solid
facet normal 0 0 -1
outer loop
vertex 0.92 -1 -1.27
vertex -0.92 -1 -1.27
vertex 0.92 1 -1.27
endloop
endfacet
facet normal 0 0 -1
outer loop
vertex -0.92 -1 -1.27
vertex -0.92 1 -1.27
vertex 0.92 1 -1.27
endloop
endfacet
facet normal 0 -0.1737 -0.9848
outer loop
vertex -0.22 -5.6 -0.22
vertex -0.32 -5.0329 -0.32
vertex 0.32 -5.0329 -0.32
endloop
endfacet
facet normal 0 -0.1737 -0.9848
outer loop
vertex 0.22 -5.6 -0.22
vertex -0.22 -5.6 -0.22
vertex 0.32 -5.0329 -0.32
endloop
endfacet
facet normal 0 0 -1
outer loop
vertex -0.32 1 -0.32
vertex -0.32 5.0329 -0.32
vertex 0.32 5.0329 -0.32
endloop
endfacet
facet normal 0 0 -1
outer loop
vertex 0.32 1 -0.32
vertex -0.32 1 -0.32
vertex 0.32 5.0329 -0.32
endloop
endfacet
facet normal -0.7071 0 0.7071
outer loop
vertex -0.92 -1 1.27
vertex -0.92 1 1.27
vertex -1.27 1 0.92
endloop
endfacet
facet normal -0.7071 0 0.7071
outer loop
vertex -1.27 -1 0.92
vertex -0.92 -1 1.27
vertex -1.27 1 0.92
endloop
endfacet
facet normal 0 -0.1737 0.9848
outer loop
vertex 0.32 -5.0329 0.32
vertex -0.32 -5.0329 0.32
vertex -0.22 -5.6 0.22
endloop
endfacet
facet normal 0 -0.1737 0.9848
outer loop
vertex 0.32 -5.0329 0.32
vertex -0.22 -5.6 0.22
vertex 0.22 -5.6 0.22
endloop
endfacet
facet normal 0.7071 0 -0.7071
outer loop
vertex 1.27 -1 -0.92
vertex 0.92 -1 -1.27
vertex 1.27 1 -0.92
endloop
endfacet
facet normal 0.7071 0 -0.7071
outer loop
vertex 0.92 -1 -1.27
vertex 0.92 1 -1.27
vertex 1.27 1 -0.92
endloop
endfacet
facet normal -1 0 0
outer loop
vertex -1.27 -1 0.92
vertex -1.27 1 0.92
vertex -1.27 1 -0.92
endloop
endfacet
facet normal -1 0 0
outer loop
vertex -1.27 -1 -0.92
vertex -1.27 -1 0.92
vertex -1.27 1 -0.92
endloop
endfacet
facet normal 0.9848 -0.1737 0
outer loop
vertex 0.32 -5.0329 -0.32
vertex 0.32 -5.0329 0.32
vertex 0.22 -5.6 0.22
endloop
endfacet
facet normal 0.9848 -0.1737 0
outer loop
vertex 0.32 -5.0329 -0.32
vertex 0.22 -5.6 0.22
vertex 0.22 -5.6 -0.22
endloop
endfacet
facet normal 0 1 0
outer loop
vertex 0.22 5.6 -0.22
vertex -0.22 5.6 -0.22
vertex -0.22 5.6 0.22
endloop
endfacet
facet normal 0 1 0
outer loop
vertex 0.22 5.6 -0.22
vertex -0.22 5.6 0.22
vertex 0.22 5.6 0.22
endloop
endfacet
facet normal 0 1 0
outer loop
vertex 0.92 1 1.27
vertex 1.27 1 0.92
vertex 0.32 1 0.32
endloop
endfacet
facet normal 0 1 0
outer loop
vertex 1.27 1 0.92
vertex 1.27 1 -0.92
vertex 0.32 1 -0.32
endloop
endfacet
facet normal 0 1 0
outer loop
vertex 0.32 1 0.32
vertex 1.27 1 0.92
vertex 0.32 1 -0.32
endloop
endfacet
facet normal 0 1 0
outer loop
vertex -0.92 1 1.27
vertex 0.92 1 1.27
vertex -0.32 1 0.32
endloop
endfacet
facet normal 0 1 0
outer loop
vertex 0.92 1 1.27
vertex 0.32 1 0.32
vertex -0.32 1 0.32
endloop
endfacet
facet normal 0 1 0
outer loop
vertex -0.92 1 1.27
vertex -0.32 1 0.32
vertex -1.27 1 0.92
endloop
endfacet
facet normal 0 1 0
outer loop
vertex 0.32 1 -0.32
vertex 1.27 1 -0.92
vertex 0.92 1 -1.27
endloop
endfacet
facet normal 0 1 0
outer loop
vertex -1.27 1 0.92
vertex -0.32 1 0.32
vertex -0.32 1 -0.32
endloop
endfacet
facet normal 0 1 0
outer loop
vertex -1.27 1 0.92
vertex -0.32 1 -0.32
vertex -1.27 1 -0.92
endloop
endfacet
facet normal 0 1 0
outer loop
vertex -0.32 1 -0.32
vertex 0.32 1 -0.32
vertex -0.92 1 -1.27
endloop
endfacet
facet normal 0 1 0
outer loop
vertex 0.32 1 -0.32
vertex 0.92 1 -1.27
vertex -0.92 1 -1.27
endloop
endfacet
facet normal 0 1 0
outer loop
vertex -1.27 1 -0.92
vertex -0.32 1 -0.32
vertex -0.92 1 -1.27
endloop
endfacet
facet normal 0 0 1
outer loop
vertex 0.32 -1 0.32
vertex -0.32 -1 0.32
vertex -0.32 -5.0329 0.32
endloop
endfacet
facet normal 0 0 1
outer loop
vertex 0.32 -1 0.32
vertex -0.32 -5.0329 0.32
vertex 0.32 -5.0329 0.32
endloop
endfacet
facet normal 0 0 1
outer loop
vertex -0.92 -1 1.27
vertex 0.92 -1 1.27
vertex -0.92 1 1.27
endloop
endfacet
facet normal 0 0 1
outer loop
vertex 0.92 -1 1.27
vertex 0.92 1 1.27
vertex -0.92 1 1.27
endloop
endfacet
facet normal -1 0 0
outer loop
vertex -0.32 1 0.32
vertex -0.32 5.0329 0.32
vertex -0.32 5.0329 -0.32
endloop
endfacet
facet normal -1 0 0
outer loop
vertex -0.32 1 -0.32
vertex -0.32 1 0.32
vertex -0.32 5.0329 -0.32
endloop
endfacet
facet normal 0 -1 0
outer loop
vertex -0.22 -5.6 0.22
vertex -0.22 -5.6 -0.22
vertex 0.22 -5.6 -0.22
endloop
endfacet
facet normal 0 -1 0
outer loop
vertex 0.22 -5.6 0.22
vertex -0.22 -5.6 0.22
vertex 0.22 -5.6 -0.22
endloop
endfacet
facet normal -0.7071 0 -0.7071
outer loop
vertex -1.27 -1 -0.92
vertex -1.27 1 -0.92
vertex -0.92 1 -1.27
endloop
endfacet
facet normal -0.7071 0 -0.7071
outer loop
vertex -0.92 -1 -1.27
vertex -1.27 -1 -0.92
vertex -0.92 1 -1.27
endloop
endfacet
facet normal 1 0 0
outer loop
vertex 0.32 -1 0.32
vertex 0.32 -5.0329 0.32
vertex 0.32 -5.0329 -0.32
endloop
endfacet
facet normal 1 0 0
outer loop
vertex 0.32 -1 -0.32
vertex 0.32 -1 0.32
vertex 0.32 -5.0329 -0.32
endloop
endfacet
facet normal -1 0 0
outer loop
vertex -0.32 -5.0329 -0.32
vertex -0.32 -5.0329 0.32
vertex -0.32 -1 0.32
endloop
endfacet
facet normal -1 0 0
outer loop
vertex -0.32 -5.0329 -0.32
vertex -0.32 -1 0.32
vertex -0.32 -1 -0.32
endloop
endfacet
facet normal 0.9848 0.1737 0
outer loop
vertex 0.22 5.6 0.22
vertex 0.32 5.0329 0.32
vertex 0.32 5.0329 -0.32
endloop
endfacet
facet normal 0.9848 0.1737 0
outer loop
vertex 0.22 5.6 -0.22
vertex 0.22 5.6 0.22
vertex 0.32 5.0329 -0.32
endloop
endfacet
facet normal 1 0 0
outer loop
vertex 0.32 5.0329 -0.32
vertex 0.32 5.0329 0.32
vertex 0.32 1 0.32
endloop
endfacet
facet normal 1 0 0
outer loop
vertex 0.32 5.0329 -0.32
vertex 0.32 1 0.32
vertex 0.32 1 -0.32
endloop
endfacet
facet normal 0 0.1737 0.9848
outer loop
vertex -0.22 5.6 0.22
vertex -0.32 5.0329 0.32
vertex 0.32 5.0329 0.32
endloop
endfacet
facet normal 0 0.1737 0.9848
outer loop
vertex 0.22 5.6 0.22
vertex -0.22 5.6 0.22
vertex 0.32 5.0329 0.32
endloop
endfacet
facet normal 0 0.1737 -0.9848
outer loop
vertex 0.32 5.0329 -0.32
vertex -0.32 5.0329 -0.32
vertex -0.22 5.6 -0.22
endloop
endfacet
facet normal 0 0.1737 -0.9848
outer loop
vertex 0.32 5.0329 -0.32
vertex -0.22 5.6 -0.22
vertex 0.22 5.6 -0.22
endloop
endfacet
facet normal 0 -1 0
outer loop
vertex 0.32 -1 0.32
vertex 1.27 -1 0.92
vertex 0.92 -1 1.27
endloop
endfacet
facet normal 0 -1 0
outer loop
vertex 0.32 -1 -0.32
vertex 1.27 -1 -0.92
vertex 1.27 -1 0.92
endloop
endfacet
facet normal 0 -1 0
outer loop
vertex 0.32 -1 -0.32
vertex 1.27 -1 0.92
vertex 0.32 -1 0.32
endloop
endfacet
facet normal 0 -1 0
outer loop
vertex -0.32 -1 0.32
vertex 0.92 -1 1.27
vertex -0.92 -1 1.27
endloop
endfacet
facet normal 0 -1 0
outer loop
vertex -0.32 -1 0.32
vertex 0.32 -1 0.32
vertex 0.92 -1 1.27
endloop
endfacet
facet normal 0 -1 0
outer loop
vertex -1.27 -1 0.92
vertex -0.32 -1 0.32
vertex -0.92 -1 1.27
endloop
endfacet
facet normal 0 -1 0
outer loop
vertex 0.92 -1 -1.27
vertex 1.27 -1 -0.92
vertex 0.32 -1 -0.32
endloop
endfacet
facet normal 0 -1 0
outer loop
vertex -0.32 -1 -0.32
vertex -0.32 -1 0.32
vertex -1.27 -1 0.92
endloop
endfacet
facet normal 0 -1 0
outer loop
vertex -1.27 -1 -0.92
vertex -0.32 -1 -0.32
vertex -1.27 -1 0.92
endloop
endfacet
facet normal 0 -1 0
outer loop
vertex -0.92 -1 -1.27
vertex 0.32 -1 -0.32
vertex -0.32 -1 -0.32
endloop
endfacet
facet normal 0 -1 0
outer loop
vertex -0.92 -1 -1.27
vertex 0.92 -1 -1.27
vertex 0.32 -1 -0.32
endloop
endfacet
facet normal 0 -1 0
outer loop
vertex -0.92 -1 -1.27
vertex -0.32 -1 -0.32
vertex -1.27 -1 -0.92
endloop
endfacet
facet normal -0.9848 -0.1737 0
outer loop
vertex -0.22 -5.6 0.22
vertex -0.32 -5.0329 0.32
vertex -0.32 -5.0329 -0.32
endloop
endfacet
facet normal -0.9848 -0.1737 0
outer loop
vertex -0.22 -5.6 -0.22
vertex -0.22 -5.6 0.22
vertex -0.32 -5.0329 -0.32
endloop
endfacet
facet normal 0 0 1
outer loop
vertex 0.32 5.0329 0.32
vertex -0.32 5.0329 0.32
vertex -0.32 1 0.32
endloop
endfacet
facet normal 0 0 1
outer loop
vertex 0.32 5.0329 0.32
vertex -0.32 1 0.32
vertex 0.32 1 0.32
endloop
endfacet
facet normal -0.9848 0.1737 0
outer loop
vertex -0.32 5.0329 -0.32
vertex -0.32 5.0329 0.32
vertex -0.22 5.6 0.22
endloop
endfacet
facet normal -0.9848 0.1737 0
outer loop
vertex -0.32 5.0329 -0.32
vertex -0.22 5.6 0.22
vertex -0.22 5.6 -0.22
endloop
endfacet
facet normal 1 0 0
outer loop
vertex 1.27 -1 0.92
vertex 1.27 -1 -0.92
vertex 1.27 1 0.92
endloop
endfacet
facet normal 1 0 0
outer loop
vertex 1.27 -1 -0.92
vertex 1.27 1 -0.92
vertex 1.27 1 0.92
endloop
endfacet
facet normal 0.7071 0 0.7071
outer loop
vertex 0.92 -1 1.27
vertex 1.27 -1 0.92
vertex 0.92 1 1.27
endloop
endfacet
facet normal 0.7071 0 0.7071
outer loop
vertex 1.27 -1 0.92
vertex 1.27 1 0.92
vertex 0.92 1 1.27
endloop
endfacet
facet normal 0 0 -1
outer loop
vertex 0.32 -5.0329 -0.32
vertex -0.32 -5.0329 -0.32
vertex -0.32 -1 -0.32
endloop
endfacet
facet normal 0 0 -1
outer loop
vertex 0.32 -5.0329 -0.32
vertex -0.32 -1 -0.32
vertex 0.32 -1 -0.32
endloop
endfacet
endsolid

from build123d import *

# Parameters (mm, degrees)
SALIENTE_EXTRUIR1_DEPTH = 1
CROQUIS2_W              = 0.64
CROQUIS2_H              = 0.64
SALIENTE_EXTRUIR2_DEPTH = 5.6
CHAFL_N1_SIZE           = 0.1
CHAFL_N1_SIZE2          = 0.567128182
CHAFL_N1_PART_2_SIZE    = 0.1
CHAFL_N1_PART_2_SIZE2   = 0.567128182


with BuildPart() as part:
    # Croquis1 → Saliente-Extruir1 (new body, symmetric)
    with BuildSketch(Plane(origin=(0, 0, 0), x_dir=(1, 0, 0), z_dir=(0, 1, 0))):
        Polygon((-1.27, 0.92), (-0.92, 1.27), (0.92, 1.27), (1.27, 0.92), (1.27, -0.92), (0.92, -1.27), (-0.92, -1.27), (-1.27, -0.92), align=None)
    extrude(amount=SALIENTE_EXTRUIR1_DEPTH, both=True)

    # Croquis2 → Saliente-Extruir2 (add, symmetric)
    with BuildSketch(Plane(origin=(0, 0, 0), x_dir=(1, 0, 0), z_dir=(0, 1, 0))):
        Rectangle(CROQUIS2_W, CROQUIS2_H)
    extrude(amount=SALIENTE_EXTRUIR2_DEPTH, both=True)

    # Chaflán1
    chafl_n1_edges = [part.edges().sort_by_distance(p)[0] for p in [
        (0.32, -5.6, 0),
        (0, -5.6, -0.32),
        (-0.32, -5.6, 0),
        (0, -5.6, 0.32),
    ]]
    chafl_n1_side = [part.faces().sort_by_distance(p)[0] for p in [
        (0, -5.6, 0),
    ]]
    chamfer(chafl_n1_edges, length=CHAFL_N1_SIZE, length2=CHAFL_N1_SIZE2, reference=chafl_n1_side[0])

    # Chaflán1 part 2
    chafl_n1_part_2_edges = [part.edges().sort_by_distance(p)[0] for p in [
        (0.32, 5.6, 0),
        (0, 5.6, -0.32),
        (-0.32, 5.6, 0),
        (0, 5.6, 0.32),
    ]]
    chafl_n1_part_2_side = [part.faces().sort_by_distance(p)[0] for p in [
        (0, 5.6, 0),
    ]]
    chamfer(chafl_n1_part_2_edges, length=CHAFL_N1_PART_2_SIZE, length2=CHAFL_N1_PART_2_SIZE2, reference=chafl_n1_part_2_side[0])


solid = part.part
